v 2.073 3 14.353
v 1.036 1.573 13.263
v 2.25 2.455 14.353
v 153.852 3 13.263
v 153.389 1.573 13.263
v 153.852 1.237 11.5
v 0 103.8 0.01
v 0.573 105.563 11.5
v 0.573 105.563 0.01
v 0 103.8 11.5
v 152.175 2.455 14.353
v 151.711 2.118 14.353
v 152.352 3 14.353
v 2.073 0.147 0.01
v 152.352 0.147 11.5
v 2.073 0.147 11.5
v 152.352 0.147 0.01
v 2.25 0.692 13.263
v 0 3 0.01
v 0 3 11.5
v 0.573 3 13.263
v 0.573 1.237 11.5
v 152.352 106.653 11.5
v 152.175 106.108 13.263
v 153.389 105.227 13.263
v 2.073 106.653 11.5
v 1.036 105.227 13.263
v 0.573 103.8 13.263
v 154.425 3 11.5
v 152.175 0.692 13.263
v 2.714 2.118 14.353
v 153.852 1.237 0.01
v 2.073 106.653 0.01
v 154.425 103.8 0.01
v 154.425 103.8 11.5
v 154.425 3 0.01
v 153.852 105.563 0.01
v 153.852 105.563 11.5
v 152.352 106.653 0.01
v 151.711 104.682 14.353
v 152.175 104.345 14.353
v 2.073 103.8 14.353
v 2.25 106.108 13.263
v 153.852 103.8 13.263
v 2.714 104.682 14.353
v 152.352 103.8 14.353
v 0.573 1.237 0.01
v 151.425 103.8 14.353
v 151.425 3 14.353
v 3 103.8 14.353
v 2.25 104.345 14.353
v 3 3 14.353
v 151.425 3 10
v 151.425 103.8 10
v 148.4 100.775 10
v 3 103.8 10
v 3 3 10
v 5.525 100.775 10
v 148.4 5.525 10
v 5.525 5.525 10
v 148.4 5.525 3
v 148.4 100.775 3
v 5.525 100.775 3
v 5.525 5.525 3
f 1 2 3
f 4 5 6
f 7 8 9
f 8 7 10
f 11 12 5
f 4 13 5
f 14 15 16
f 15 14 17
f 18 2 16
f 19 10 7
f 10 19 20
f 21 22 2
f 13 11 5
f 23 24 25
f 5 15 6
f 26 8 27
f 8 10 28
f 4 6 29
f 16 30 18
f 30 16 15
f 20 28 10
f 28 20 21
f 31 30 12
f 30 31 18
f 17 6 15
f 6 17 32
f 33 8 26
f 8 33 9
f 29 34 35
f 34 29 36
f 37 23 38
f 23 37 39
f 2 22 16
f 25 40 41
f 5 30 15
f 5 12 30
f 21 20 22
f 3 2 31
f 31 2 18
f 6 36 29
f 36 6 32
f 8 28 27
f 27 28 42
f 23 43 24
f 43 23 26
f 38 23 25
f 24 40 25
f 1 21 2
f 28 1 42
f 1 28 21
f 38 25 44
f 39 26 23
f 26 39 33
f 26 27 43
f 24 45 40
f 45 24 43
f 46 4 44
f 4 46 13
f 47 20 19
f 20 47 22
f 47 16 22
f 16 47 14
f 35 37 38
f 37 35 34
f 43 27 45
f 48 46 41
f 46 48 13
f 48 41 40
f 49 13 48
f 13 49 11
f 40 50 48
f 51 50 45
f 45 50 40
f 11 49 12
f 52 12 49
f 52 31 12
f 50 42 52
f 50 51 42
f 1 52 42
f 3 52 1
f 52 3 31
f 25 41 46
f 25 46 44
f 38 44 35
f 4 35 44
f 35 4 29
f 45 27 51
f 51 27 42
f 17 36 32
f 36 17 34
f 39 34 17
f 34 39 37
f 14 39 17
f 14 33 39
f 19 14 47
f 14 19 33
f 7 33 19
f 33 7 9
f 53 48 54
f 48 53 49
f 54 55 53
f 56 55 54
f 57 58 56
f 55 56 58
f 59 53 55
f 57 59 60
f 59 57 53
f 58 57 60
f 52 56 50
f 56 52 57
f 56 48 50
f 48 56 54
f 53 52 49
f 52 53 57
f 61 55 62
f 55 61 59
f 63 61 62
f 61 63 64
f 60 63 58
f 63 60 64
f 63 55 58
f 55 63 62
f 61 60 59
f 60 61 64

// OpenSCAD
// file: variables.scad
// LAYOUT

sample_layout = [
    [1.5, 1, 1, 1, 1, 1, 1],
    [1.5, 1, 1, 1, 1, 1, 1],
    [1.5, 1, 1, 1, 1, 1, 1],
    [1.5, 1, 1, 1, 1, 1, 1],
    [1.5, 1.5, 1.25, 2.75]
];

layout = sample_layout;

// INDEPENDENT VARIABLES

reinforcement = 3;      // reinforcement thickness
wall = 3;             // thickness of the wall of the case
tol = 0.25;             // tolerance between the plate and the case
z = 0.02;               // small value to help stop z-fighting

// CHERRY-DEFINED VARIABLES (not recommended to change)

u = 19.05;              // single key "unit"
gap = 5.05;             // edge-to-edge case spacing
plate = 1.5;            // plate thickness
switch = 10;            // clearance height of the switch

stab_width = 3.3;       // stabilizer hole width
stab_height = 14.2;     // stabilizer hole height
stab_offset = 0.55;     // stabilizer vertical offset from key hole

// DEPENDENT VARIABLES (not recommended to change)

// 2D array the same dimensions as layout containing the cumulative distance
// (in Cherry "units") from the edge of the board instead of the size of the key
distance = [
    for (row = layout) [
        for (i=[0:len(row)-1])
            let (sub_array = [ for (j=[0:i]) row[j] ])
            [ for (x=sub_array) 1]*sub_array
    ]
];
width = max([for(row = distance) row[len(row) - 1]]) * u + gap; // plate width
depth = len(layout) * u + gap;                                  // plate depth
// main file
include <./variables.scad>;

difference() {
    translate([wall, wall, 0]) minkowski() {
        sphere(wall);
        cube([width + 2*tol, depth + 2*tol, plate + switch]);
    }
    translate([-z/2, -z/2, -wall - z/2])
        cube([width + 2*tol + 2*wall + z, depth + 2*tol + 2*wall + z, wall + z]);

    translate([wall, wall, wall + switch - reinforcement])
        cube([width + 2*tol, depth + 2*tol, plate + reinforcement + z]);

    translate([wall + gap/2, wall + gap/2, wall])
        cube([width - gap, depth - gap, switch]);
}
